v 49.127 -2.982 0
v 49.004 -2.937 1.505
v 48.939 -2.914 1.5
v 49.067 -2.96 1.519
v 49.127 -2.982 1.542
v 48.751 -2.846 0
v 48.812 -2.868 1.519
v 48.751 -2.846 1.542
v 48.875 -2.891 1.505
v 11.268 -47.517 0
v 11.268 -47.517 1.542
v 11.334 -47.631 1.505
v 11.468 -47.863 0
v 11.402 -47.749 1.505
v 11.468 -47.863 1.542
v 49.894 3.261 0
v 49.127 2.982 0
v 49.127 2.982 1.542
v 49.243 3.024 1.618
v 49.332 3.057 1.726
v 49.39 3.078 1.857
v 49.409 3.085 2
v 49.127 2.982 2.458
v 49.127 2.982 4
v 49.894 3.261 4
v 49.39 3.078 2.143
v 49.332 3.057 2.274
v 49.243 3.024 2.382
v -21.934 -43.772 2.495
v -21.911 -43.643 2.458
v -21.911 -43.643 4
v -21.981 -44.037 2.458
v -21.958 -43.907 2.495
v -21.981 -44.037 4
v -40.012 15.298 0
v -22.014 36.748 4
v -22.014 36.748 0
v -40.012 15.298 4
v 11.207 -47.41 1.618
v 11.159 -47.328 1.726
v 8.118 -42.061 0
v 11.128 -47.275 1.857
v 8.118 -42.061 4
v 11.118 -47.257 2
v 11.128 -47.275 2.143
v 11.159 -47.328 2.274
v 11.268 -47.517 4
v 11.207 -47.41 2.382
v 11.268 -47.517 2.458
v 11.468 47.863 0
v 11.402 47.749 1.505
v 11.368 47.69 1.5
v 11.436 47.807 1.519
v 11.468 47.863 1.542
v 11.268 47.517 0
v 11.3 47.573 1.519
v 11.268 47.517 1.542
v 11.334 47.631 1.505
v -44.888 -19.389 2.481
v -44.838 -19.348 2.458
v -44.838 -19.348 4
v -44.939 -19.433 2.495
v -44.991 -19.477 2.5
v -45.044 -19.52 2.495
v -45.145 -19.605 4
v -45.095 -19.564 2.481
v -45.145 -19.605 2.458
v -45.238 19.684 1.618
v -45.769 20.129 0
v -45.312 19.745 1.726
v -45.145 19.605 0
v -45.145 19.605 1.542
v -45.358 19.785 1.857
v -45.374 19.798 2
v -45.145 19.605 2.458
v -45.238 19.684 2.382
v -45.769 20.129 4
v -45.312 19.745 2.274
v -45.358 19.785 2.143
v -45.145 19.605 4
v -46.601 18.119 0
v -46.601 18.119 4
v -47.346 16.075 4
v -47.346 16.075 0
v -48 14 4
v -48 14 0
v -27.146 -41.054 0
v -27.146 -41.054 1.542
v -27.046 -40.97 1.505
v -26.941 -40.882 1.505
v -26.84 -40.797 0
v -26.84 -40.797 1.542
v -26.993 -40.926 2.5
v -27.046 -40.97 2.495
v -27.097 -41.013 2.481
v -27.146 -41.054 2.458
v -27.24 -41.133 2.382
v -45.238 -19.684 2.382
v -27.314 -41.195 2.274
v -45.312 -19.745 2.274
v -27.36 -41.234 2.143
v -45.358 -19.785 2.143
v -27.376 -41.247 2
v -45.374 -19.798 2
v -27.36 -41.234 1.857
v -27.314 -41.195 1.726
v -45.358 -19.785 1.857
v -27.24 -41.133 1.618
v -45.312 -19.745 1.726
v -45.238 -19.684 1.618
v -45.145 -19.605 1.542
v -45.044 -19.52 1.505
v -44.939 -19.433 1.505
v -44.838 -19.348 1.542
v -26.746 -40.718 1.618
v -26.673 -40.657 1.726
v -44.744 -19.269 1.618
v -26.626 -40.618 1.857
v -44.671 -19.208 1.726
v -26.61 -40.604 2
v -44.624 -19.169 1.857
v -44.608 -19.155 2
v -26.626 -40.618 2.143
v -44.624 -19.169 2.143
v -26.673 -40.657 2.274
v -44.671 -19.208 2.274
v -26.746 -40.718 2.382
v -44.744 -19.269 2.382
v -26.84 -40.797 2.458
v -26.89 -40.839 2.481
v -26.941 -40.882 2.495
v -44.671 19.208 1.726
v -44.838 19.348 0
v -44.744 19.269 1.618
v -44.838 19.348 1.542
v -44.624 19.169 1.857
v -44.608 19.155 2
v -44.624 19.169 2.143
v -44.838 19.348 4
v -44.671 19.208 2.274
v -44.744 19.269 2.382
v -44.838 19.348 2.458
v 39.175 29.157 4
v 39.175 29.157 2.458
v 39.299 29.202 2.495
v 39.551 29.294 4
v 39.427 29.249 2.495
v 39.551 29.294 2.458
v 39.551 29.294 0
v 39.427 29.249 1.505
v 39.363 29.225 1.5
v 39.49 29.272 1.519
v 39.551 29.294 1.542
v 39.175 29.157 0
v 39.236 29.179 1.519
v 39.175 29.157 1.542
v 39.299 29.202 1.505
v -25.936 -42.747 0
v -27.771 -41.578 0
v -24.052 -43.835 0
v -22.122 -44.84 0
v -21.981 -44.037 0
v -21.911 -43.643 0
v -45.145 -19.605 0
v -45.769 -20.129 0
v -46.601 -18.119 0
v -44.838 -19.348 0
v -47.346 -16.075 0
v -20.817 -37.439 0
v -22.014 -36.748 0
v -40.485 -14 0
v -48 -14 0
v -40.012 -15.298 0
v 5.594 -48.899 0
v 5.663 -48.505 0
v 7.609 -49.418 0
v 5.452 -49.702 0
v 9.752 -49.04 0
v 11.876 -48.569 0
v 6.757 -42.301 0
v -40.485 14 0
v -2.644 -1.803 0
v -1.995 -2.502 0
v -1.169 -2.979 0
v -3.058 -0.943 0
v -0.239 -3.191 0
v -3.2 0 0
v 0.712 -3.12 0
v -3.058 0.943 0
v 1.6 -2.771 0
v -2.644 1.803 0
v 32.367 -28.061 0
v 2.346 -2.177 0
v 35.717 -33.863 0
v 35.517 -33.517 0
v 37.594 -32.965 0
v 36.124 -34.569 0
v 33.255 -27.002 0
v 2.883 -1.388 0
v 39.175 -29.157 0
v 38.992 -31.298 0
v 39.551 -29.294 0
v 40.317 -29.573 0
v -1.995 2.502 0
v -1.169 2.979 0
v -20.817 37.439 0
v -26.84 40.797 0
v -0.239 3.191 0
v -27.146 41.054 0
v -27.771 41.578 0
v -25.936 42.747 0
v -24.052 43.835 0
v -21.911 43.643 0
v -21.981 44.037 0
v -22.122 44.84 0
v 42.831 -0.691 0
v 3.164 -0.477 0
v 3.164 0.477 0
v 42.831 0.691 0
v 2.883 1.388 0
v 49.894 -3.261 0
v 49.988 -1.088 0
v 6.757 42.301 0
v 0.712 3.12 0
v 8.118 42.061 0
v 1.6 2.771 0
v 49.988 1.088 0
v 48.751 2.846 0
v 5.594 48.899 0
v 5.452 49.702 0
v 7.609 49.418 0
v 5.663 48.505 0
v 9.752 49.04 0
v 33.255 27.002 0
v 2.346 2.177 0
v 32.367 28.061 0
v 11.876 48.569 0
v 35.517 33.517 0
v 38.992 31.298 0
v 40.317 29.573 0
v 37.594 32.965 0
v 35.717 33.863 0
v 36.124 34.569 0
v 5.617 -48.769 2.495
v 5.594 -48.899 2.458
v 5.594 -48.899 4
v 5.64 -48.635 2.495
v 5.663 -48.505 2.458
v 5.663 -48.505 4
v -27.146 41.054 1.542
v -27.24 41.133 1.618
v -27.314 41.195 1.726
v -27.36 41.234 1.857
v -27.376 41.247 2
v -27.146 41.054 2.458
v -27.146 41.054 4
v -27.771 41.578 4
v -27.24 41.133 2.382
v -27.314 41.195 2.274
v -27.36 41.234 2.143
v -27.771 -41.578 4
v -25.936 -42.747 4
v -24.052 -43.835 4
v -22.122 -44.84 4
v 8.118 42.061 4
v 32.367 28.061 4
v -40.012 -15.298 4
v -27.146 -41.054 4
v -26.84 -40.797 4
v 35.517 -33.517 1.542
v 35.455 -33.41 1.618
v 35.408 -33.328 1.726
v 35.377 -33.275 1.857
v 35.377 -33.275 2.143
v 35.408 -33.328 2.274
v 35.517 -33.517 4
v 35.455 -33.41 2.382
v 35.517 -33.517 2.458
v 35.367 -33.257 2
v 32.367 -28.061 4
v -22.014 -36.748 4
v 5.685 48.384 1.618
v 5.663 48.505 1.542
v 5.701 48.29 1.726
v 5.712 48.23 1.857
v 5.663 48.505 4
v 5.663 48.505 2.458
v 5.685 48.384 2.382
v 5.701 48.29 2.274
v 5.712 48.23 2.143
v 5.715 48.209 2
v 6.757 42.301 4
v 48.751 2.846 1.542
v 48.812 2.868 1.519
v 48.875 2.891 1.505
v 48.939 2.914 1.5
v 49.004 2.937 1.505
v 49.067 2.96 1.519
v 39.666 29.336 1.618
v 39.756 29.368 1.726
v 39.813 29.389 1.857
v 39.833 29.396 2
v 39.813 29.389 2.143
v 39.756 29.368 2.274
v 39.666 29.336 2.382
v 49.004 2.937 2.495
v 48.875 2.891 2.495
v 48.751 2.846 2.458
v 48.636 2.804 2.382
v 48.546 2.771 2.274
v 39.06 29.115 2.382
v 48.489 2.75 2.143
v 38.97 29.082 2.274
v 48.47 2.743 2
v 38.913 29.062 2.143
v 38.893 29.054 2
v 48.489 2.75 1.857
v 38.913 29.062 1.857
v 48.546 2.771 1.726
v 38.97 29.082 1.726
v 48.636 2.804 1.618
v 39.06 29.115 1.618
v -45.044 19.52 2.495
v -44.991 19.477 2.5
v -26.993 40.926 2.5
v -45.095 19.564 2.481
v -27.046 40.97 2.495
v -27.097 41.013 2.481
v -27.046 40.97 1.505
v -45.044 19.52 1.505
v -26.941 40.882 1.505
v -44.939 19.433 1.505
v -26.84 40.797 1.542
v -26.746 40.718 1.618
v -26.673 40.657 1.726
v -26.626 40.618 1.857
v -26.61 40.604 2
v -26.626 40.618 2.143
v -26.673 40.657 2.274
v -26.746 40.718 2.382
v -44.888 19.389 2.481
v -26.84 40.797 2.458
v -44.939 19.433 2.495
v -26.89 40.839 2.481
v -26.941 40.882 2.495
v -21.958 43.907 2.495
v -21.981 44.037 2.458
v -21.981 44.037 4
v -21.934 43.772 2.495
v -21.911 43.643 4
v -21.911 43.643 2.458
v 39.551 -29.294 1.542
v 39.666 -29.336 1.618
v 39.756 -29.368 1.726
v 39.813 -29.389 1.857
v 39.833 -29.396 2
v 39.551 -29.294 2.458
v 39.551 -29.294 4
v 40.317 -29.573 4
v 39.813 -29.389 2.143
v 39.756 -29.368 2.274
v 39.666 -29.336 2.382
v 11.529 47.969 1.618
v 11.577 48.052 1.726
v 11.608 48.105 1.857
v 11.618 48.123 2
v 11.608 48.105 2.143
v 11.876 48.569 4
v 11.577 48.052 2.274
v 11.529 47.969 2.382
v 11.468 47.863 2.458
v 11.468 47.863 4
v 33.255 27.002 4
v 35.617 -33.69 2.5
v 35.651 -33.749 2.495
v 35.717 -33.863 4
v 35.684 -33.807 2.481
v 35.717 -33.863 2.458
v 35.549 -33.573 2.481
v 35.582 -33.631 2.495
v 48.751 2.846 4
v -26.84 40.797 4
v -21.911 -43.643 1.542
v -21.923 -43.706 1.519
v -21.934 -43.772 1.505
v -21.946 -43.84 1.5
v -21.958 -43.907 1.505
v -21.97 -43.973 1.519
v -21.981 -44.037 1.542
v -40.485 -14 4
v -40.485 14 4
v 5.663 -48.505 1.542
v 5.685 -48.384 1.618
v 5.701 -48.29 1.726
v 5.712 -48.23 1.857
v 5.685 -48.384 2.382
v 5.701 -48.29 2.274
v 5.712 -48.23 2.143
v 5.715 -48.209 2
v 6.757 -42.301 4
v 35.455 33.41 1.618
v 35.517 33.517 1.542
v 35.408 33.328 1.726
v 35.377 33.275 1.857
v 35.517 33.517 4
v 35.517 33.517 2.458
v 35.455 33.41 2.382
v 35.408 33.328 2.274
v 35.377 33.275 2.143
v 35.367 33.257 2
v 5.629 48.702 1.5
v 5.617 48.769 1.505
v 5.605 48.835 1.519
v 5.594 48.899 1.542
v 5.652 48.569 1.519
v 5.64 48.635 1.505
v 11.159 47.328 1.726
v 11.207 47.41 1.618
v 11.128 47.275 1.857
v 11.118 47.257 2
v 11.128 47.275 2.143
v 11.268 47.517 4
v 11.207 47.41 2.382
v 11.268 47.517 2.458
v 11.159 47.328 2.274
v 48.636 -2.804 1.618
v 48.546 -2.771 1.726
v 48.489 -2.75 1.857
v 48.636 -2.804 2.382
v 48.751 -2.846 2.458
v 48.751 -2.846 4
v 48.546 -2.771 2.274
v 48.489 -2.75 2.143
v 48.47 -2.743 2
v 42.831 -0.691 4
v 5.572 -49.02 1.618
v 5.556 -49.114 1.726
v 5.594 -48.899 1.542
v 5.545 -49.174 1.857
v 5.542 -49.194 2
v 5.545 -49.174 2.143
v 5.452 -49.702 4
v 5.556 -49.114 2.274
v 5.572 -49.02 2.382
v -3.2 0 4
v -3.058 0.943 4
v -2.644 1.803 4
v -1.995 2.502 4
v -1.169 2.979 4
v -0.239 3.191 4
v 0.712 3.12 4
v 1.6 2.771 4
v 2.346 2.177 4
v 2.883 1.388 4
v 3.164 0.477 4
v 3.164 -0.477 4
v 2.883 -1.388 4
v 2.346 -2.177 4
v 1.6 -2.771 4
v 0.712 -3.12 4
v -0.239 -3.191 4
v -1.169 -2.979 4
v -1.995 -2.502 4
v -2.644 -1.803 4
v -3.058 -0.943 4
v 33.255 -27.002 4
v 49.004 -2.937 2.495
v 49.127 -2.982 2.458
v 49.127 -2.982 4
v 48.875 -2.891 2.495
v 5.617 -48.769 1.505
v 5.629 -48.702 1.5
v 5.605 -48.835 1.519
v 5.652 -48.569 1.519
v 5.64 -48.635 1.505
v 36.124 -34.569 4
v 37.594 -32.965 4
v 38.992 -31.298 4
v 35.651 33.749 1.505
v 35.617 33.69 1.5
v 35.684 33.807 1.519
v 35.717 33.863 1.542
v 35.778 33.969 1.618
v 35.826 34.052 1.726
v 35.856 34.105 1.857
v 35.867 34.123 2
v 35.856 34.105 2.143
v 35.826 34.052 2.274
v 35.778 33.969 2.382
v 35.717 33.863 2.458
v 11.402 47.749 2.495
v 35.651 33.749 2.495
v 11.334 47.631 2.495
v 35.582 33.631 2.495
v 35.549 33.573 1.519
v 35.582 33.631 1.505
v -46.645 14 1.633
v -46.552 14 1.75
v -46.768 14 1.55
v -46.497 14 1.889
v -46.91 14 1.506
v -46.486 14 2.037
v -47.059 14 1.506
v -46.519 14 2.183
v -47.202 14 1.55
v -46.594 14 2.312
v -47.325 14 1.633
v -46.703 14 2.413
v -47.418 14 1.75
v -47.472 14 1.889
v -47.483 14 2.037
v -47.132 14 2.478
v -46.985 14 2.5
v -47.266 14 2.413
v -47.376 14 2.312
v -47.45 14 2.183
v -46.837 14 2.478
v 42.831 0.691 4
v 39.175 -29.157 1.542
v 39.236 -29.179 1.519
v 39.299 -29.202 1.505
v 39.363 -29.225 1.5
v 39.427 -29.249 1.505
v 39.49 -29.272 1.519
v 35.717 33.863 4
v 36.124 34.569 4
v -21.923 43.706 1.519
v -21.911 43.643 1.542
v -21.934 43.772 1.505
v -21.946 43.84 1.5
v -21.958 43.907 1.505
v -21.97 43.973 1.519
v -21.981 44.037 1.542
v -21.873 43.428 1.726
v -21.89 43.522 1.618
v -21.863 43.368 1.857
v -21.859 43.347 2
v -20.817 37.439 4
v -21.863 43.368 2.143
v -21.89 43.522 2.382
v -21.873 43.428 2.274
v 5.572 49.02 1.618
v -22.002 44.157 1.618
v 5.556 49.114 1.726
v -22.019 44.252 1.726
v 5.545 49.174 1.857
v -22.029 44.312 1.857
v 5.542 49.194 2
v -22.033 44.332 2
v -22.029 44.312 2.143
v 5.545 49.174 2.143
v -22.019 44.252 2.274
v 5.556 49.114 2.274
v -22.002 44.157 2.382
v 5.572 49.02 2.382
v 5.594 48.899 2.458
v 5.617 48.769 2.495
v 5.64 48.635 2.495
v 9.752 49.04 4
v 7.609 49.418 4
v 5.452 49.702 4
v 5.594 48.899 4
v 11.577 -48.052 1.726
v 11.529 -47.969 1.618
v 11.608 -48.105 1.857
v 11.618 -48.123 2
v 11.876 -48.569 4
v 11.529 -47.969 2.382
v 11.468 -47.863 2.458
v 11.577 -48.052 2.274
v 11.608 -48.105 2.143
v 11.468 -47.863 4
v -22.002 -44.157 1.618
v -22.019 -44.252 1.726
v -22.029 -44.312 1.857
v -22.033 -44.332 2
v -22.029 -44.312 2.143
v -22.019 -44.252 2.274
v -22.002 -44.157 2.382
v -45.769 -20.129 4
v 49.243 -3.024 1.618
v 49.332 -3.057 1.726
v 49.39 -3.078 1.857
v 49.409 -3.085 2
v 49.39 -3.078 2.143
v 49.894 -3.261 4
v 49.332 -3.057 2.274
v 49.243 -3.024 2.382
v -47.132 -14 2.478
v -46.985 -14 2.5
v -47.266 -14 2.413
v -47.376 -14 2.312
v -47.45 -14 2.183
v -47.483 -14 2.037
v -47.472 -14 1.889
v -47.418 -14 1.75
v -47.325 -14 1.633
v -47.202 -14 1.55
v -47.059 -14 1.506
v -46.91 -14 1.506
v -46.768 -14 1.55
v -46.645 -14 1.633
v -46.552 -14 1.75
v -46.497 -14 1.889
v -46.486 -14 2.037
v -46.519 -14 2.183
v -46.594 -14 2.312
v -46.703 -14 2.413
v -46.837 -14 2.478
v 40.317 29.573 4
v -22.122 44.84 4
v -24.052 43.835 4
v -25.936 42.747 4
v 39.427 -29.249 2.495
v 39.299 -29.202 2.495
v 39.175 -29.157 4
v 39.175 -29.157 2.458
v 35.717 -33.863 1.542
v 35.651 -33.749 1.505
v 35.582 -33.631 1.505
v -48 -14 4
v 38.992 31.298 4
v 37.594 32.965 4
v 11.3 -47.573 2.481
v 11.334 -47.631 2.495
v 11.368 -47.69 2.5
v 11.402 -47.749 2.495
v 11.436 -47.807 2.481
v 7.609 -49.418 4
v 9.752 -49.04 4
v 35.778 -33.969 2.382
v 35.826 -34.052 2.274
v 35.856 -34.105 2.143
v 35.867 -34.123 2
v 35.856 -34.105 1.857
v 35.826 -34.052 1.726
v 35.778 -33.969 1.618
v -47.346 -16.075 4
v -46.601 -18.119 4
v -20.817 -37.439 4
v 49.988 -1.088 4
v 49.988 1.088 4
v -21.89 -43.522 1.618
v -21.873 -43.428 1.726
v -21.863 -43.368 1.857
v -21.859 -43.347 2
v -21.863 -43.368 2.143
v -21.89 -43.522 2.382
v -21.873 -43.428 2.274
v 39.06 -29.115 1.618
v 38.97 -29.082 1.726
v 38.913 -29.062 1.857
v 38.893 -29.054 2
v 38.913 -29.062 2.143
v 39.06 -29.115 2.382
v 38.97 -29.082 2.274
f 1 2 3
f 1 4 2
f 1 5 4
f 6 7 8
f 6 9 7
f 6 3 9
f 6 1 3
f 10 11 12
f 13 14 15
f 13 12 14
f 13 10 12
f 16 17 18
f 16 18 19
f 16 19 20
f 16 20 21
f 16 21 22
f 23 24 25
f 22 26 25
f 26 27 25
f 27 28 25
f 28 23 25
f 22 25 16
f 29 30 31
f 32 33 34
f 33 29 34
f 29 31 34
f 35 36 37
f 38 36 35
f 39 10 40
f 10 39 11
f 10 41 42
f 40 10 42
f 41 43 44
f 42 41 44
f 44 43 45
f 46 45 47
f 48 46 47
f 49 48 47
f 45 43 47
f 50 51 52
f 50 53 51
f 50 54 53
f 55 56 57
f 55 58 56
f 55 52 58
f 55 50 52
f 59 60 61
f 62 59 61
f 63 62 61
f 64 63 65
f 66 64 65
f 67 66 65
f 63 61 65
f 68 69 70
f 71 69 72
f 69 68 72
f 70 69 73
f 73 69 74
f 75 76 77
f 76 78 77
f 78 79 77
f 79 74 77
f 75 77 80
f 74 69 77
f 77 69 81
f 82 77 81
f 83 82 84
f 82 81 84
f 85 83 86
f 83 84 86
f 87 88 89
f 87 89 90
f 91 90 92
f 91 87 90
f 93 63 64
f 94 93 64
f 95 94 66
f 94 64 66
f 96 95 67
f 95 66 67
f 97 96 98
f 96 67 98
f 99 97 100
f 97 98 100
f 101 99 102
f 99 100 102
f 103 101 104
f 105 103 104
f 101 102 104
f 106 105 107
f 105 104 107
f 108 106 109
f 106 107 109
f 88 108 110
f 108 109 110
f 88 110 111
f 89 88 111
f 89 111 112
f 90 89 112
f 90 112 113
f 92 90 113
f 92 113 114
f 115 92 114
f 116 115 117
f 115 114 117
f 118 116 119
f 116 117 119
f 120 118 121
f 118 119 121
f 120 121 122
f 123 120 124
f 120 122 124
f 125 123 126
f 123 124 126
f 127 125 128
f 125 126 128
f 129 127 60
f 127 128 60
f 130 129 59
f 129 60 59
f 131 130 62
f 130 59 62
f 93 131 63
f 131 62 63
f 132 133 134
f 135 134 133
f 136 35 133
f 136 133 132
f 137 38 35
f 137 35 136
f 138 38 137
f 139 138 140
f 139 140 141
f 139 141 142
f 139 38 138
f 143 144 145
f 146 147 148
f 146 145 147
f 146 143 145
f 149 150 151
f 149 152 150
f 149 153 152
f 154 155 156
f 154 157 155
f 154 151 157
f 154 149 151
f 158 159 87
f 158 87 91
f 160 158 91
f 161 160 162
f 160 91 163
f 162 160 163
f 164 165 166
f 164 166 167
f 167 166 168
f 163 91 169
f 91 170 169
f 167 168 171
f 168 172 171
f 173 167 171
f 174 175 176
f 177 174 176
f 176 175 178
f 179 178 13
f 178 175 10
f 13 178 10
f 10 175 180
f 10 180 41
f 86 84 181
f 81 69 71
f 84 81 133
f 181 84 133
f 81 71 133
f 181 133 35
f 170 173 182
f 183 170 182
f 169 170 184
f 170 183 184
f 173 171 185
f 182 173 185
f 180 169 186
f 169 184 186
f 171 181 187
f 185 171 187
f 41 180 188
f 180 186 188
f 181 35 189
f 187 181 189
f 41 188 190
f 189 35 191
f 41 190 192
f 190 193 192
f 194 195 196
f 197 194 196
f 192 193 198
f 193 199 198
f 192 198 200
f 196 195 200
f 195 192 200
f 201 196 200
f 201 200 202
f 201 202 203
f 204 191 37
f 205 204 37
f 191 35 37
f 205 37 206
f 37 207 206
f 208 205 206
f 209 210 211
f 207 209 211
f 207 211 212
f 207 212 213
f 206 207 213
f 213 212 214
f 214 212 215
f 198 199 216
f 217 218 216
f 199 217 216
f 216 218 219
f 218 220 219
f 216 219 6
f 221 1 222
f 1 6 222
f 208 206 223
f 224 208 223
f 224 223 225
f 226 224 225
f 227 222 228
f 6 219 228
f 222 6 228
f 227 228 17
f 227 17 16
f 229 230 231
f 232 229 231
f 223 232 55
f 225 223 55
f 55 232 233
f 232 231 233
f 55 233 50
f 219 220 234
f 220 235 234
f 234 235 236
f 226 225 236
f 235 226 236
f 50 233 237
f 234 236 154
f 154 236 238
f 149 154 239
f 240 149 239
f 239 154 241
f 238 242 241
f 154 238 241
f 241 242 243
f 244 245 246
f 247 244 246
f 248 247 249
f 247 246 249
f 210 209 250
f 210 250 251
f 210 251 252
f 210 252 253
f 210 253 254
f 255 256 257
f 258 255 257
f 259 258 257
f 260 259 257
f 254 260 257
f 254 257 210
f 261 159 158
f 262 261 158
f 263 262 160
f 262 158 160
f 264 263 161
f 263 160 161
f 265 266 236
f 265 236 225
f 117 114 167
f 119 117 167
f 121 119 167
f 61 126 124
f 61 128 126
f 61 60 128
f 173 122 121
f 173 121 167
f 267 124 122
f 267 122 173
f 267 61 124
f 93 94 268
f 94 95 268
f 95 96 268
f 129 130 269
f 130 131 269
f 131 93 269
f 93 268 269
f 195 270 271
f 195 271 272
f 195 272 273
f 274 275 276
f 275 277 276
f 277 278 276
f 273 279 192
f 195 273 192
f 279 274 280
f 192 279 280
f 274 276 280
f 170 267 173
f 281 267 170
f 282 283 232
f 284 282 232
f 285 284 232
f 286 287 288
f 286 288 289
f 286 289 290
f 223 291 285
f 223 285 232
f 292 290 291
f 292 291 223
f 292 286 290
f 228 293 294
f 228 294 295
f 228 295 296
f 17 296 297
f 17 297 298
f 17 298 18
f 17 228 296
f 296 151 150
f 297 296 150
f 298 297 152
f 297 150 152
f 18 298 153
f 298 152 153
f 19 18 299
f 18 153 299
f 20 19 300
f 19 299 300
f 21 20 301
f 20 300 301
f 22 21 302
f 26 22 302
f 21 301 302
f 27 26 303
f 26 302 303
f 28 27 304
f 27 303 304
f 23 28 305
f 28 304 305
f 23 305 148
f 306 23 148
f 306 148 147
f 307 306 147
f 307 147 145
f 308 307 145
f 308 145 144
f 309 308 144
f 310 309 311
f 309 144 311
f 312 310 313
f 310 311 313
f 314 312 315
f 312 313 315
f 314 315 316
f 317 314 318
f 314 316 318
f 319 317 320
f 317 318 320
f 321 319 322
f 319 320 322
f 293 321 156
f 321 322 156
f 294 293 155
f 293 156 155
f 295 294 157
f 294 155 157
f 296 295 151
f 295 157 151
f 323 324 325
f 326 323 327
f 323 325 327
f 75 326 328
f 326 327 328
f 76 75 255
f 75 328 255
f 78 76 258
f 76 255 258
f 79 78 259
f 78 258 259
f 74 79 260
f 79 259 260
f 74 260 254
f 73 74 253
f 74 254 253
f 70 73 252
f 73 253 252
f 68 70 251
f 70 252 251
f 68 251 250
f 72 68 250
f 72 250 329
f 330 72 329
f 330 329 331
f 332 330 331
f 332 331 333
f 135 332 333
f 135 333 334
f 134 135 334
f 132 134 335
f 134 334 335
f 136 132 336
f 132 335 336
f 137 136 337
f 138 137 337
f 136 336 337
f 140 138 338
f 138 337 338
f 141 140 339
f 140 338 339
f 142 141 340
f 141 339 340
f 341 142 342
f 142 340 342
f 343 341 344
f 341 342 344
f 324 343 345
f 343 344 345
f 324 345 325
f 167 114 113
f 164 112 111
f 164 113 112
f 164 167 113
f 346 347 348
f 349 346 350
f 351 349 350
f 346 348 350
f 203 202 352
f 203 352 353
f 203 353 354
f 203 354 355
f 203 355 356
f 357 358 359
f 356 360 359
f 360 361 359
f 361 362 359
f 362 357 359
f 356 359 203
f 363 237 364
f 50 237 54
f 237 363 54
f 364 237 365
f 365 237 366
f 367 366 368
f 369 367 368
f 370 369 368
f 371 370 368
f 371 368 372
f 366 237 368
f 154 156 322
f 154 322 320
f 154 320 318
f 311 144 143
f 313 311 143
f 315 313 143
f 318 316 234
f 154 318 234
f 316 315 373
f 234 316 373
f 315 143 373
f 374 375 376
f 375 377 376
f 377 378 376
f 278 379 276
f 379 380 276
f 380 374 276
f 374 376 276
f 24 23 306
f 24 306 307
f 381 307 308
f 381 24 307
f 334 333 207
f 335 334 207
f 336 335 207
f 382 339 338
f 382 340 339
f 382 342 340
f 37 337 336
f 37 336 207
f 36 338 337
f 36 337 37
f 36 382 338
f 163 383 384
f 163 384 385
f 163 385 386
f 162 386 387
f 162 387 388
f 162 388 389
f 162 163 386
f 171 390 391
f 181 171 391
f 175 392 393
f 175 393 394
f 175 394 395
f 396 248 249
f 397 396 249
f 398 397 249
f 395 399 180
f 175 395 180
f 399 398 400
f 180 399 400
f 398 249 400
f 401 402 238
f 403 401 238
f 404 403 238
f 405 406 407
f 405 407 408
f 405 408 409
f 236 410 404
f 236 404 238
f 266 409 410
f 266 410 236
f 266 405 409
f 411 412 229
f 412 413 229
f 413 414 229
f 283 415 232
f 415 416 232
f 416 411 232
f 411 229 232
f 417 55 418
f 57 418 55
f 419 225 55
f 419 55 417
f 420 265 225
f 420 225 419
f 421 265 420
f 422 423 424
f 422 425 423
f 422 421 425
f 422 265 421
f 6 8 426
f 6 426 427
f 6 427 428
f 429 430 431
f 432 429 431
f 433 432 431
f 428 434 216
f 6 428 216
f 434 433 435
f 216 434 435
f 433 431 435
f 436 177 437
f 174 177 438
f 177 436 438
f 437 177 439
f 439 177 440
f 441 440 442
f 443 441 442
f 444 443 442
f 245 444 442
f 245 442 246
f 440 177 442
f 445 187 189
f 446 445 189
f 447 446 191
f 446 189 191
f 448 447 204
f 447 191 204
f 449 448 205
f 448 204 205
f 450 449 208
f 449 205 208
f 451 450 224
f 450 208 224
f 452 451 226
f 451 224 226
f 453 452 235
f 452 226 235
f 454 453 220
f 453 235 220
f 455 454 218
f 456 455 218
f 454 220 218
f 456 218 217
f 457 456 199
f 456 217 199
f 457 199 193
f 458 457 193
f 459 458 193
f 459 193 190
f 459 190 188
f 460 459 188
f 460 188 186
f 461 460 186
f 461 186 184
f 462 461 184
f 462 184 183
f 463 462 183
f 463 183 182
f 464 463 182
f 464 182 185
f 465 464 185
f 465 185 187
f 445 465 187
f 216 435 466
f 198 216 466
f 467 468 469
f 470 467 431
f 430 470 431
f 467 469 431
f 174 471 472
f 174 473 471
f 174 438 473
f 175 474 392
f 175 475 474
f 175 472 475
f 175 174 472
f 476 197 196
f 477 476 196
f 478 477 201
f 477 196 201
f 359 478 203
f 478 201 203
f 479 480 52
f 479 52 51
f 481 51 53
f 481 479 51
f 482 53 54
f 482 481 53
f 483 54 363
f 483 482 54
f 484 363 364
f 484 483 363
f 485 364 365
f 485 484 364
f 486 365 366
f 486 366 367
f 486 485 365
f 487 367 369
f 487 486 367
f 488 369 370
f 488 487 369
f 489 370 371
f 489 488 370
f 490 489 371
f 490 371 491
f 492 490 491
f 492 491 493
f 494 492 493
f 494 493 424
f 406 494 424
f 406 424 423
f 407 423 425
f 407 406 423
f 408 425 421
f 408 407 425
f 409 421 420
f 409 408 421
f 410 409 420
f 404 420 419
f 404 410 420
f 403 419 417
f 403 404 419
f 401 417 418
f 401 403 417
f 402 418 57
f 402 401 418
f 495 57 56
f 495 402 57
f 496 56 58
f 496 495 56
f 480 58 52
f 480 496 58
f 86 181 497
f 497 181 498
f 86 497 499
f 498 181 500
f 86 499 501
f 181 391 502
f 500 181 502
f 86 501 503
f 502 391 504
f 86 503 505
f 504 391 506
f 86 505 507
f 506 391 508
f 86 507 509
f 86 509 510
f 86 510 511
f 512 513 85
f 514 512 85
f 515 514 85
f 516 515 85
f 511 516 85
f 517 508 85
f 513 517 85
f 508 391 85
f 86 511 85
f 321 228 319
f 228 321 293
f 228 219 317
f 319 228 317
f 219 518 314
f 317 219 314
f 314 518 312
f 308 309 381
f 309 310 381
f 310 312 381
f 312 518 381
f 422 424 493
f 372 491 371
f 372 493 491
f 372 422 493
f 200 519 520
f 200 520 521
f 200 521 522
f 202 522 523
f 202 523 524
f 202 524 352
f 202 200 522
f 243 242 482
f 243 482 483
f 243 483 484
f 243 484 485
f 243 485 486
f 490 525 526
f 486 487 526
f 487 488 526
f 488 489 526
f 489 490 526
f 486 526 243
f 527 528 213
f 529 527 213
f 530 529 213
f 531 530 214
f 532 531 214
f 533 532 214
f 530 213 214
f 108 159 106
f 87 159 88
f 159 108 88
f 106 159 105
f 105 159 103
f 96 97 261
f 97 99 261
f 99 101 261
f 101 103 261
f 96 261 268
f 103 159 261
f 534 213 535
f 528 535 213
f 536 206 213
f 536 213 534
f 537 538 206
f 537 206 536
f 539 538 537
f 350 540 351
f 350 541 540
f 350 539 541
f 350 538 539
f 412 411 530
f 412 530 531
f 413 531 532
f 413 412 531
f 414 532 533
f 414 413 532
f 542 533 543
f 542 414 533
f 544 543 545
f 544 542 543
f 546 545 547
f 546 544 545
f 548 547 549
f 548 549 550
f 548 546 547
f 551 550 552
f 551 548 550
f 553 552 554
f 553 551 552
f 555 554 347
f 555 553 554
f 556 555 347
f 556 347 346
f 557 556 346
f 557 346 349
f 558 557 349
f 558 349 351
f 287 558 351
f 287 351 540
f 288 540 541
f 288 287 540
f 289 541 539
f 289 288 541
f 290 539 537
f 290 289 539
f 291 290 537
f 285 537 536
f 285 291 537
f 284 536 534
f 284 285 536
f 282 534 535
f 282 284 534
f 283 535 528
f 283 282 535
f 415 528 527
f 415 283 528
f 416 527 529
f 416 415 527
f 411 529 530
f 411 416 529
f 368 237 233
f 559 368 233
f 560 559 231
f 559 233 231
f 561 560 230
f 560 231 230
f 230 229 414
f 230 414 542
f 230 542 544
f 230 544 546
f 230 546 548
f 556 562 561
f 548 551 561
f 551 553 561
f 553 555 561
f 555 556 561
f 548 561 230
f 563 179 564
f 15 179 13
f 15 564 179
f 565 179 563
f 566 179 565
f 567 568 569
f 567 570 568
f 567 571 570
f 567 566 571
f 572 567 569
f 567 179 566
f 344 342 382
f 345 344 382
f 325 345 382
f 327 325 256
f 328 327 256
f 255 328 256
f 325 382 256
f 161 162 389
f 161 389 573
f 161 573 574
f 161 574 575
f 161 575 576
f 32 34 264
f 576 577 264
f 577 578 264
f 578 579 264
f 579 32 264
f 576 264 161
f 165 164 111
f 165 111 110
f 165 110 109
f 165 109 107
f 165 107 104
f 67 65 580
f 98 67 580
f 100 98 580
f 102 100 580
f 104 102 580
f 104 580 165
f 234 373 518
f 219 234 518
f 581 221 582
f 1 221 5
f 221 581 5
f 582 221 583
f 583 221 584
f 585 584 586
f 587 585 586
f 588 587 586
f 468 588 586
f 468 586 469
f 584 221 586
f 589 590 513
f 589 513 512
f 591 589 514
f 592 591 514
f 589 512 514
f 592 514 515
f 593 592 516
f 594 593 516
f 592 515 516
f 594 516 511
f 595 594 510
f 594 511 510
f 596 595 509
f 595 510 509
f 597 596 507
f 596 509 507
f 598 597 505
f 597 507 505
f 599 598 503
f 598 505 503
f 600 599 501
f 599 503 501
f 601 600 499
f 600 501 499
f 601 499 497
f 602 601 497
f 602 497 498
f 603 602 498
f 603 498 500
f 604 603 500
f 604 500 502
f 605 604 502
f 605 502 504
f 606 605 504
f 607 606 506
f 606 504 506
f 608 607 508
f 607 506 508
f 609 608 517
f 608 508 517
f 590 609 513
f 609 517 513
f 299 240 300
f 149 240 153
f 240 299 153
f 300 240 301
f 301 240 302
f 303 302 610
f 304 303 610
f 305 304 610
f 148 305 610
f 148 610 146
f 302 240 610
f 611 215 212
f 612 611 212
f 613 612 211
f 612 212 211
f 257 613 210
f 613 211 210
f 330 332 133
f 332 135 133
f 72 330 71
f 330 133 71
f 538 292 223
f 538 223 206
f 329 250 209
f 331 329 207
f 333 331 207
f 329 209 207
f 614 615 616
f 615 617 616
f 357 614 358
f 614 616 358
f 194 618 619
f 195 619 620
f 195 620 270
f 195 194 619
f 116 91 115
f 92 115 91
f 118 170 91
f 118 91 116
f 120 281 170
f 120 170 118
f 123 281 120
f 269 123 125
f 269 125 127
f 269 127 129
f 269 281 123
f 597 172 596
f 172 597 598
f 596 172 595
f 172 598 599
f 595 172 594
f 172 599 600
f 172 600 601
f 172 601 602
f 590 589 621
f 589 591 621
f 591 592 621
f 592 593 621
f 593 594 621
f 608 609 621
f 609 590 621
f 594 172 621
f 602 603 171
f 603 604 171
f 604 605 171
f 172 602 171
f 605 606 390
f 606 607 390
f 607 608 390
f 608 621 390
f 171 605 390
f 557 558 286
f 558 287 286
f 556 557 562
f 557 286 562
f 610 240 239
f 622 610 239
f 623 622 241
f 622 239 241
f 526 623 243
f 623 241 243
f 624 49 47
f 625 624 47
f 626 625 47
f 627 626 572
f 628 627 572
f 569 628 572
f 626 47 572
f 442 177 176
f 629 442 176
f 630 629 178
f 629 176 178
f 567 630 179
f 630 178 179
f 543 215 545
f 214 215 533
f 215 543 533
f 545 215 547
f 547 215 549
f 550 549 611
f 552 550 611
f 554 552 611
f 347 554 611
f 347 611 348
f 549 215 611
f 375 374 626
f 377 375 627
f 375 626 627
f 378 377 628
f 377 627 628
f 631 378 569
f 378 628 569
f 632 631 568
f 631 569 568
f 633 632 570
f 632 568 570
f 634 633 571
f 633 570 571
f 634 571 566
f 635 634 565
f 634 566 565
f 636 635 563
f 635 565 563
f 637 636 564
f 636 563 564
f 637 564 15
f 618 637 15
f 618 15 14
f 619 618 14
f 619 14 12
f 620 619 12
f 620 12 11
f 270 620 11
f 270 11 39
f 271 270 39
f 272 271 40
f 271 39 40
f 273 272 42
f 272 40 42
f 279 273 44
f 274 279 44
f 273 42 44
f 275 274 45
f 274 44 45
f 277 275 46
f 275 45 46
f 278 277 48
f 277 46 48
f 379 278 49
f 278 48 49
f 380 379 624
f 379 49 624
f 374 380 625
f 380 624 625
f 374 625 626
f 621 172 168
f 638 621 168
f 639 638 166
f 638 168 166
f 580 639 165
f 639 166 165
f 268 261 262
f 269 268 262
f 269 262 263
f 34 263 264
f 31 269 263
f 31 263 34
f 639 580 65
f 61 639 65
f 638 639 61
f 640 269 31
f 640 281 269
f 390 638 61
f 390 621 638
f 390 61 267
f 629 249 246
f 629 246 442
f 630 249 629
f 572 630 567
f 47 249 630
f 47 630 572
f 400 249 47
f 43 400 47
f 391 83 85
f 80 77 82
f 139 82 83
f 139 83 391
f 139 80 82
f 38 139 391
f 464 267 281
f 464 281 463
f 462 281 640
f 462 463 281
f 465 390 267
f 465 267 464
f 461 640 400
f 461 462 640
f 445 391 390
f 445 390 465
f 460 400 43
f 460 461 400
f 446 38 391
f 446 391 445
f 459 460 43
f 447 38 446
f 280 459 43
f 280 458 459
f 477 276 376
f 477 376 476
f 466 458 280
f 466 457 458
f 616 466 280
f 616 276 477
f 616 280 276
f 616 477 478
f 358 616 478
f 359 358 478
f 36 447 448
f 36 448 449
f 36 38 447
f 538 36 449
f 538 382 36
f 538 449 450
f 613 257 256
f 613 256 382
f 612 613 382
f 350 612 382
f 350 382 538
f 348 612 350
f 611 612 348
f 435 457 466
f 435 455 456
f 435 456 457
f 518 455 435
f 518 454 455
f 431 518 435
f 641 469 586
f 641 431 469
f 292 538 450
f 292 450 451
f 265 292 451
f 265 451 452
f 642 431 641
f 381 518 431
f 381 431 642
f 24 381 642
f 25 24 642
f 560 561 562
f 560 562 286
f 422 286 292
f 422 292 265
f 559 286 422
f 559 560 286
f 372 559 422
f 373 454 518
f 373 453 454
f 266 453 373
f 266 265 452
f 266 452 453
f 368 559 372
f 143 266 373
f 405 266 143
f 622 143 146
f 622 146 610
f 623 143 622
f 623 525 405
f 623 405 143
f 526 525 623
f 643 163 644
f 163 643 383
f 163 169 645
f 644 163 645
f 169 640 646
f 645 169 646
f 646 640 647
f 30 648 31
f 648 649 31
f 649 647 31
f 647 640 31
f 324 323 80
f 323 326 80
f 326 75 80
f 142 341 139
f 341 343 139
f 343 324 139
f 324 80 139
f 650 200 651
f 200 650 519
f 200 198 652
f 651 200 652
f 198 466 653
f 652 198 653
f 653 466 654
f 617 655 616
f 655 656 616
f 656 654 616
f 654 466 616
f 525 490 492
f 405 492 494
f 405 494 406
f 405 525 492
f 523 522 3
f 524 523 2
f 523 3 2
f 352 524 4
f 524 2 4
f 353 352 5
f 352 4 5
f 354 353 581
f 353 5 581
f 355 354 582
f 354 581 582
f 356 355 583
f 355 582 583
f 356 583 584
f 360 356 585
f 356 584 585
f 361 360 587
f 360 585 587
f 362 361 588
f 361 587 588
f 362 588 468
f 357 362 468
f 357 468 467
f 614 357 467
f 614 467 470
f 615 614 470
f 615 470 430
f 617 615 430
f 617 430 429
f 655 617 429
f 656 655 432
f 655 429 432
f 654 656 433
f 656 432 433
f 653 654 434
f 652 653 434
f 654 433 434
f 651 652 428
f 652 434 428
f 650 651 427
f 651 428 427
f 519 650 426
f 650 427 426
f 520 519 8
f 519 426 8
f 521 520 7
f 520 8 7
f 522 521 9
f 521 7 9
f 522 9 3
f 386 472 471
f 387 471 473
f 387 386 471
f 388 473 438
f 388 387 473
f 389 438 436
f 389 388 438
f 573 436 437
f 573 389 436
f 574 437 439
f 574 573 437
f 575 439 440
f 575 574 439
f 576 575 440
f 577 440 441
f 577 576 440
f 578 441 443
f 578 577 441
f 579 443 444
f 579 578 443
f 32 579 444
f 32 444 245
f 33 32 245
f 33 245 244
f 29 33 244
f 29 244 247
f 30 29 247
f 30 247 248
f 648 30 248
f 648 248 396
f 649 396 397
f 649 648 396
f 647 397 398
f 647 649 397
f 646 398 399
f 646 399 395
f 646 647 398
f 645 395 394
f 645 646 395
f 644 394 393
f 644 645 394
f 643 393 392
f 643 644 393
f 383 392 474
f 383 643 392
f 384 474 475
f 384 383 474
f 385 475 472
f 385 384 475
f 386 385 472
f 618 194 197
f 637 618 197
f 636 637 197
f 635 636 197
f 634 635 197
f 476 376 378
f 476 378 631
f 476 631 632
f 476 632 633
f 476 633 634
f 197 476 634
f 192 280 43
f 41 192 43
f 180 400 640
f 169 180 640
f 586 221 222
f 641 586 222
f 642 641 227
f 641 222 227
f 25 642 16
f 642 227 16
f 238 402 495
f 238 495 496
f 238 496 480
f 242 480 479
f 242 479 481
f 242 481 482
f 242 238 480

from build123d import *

# Parameters (mm, degrees)
SKETCH1_R           = 50
BOSS_EXTRUDE1_DEPTH = 4
SKETCH2_W           = 6.3
SKETCH2_H           = 28
CUT_EXTRUDE1_DEPTH  = 4
SKETCH5_W           = 0.4
SKETCH5_H           = 28
CUT_EXTRUDE2_DEPTH  = 1.8
SKETCH7_W           = 0.4
SKETCH7_H           = 28
CUT_EXTRUDE3_DEPTH  = 1.8
SKETCH8_W           = 0.5
SKETCH8_H           = 28
SKETCH9_W           = 0.5
SKETCH9_H           = 28
SKETCH10_W          = 28
SKETCH10_H          = 0.5
SKETCH11_W          = 28
SKETCH11_H          = 0.5
SKETCH12_W          = 0.5
SKETCH12_H          = 28
SKETCH13_W          = 0.5
SKETCH13_H          = 28
SKETCH14_W          = 28
SKETCH14_H          = 0.5
SKETCH15_W          = 0.5
SKETCH15_H          = 28
SKETCH16_W          = 28
SKETCH16_H          = 0.5
SKETCH17_R          = 3.2
CUT_EXTRUDE4_DEPTH  = 10


with BuildPart() as part:
    # Sketch1 → Boss-Extrude1 (new body)
    with BuildSketch(Plane.XY):
        Circle(SKETCH1_R)
    extrude(amount=BOSS_EXTRUDE1_DEPTH)

    # Sketch2 → Cut-Extrude1 (cut)
    with BuildSketch(Plane.XY.offset(4)):
        Polygon((5.663242619, 48.504941857), (6.757226139, 42.300653013), (-20.817390946, 37.438504038), (-21.911374465, 43.642792882), align=None)
        with BuildLine():
            Line((5.593783348, 48.898864958), (5.452196014, 49.701846632))
            ThreePointArc((5.452196014, 49.701846632), (-8.682408883, 49.240387651), (-22.12242107, 44.839697657))
            Line((-22.12242107, 44.839697657), (-21.980833736, 44.036715983))
            Line((-21.980833736, 44.036715983), (5.593783348, 48.898864958))
        make_face()
        Polygon((35.516671173, 33.516678987), (32.366671173, 28.060718943), (8.117959867, 42.060718943), (11.267959867, 47.516678987), align=None)
        Polygon((33.254827036, 27.002256002), (42.831391049, 0.69086262), (48.75145456, 2.845589522), (39.174890547, 29.156982905), align=None)
        with BuildLine():
            Line((40.316963791, 29.572663571), (39.550767596, 29.293790962))
            Line((39.550767596, 29.293790962), (49.127331609, 2.98239758))
            Line((49.127331609, 2.98239758), (49.893527804, 3.261270189))
            ThreePointArc((49.893527804, 3.261270189), (46.984631039, 17.101007166), (40.316963791, 29.572663571))
        make_face()
        with BuildLine():
            ThreePointArc((40.316963791, -29.572663571), (46.984631039, -17.101007166), (49.893527804, -3.261270189))
            Line((49.893527804, -3.261270189), (49.127331609, -2.98239758))
            Line((49.127331609, -2.98239758), (39.550767596, -29.293790962))
            Line((39.550767596, -29.293790962), (40.316963791, -29.572663571))
        make_face()
        Polygon((32.366671173, -28.060718943), (8.117959867, -42.060718943), (11.267959867, -47.516678987), (35.516671173, -33.516678987), align=None)
        with BuildLine():
            ThreePointArc((-22.12242107, -44.839697657), (-8.682408883, -49.240387651), (5.452196014, -49.701846632))
            Line((5.452196014, -49.701846632), (5.593783348, -48.898864958))
            Line((5.593783348, -48.898864958), (-21.980833736, -44.036715983))
            Line((-21.980833736, -44.036715983), (-22.12242107, -44.839697657))
        make_face()
        Polygon((6.757226139, -42.300653013), (-20.817390946, -37.438504038), (-21.911374465, -43.642792882), (5.663242619, -48.504941857), align=None)
        with BuildLine():
            Line((-45.144550944, -19.605073996), (-45.769159805, -20.129183061))
            ThreePointArc((-45.769159805, -20.129183061), (-38.302222156, -32.139380484), (-27.771106734, -41.578427469))
            Line((-27.771106734, -41.578427469), (-27.146497873, -41.054318403))
            Line((-27.146497873, -41.054318403), (-45.144550944, -19.605073996))
        make_face()
        Polygon((-44.838133167, -19.347958952), (-40.012053175, -15.298397011), (-22.014000104, -36.747641418), (-26.840080095, -40.797203359), align=None)
        with BuildLine():
            Line((-47.184631039, 14), (-48, 14))
            ThreePointArc((-48, 14), (-50, 0), (-48, -14))
            Line((-48, -14), (-47.184631039, -14))
            Line((-47.184631039, -14), (-47.184631039, 14))
        make_face()
        with Locations((-43.634631039, 0)):
            Rectangle(SKETCH2_W, SKETCH2_H)
        Polygon((-26.840080095, 40.797203359), (-22.014000104, 36.747641418), (-40.012053175, 15.298397011), (-44.838133167, 19.347958952), align=None)
        with BuildLine():
            Line((-27.146497873, 41.054318403), (-27.771106734, 41.578427469))
            ThreePointArc((-27.771106734, 41.578427469), (-38.302222156, 32.139380484), (-45.769159805, 20.129183061))
            Line((-45.769159805, 20.129183061), (-45.144550944, 19.605073996))
            Line((-45.144550944, 19.605073996), (-27.146497873, 41.054318403))
        make_face()
        with BuildLine():
            ThreePointArc((36.124355653, 34.569219382), (25, 43.301270189), (11.875644347, 48.569219382))
            Line((11.875644347, 48.569219382), (11.467959867, 47.863089148))
            Line((11.467959867, 47.863089148), (35.716671173, 33.863089148))
            Line((35.716671173, 33.863089148), (36.124355653, 34.569219382))
        make_face()
        Polygon((42.831391049, -0.69086262), (33.254827036, -27.002256002), (39.174890547, -29.156982905), (48.75145456, -2.845589522), align=None)
        with BuildLine():
            Line((11.467959867, -47.863089148), (35.716671173, -33.863089148))
            Line((35.716671173, -33.863089148), (36.124355653, -34.569219382))
            ThreePointArc((36.124355653, -34.569219382), (25, -43.301270189), (11.875644347, -48.569219382))
            Line((11.875644347, -48.569219382), (11.467959867, -47.863089148))
        make_face()
    extrude(amount=-CUT_EXTRUDE1_DEPTH, mode=Mode.SUBTRACT)

    # Sketch5 → Cut-Extrude2 (cut)
    with BuildSketch(Plane.XY.offset(4)):
        Polygon((39.174890547, 29.156982905), (39.550767596, 29.293790962), (49.127331609, 2.98239758), (48.75145456, 2.845589522), align=None)
        Polygon((39.174890547, -29.156982905), (39.550767596, -29.293790962), (49.127331609, -2.98239758), (48.75145456, -2.845589522), align=None)
        Polygon((11.267959867, -47.516678987), (11.467959867, -47.863089148), (35.716671173, -33.863089148), (35.516671173, -33.516678987), align=None)
        Polygon((-21.911374465, -43.642792882), (-21.980833736, -44.036715983), (5.593783348, -48.898864958), (5.663242619, -48.504941857), align=None)
        Polygon((-27.146497873, -41.054318403), (-26.840080095, -40.797203359), (-44.838133167, -19.347958952), (-45.144550944, -19.605073996), align=None)
        with Locations((-46.984631039, 0)):
            Rectangle(SKETCH5_W, SKETCH5_H)
        Polygon((-45.144550944, 19.605073996), (-44.838133167, 19.347958952), (-26.840080095, 40.797203359), (-27.146497873, 41.054318403), align=None)
        Polygon((-21.980833736, 44.036715983), (-21.911374465, 43.642792882), (5.663242619, 48.504941857), (5.593783348, 48.898864958), align=None)
        Polygon((11.267959867, 47.516678987), (11.467959867, 47.863089148), (35.716671173, 33.863089148), (35.516671173, 33.516678987), align=None)
    extrude(amount=-CUT_EXTRUDE2_DEPTH, mode=Mode.SUBTRACT)

    # Sketch7 → Cut-Extrude3 (cut)
    with BuildSketch(Plane(origin=(0, 0, 0), x_dir=(-1, 0, 0), z_dir=(0, 0, -1))):
        with Locations((46.984631039, 0)):
            Rectangle(SKETCH7_W, SKETCH7_H)
        Polygon((44.838133167, -19.347958952), (45.144550944, -19.605073996), (27.146497873, -41.054318403), (26.840080095, -40.797203359), align=None)
        Polygon((21.911374465, -43.642792882), (21.980833736, -44.036715983), (-5.593783348, -48.898864958), (-5.663242619, -48.504941857), align=None)
        Polygon((-11.267959867, -47.516678987), (-11.467959867, -47.863089148), (-35.716671173, -33.863089148), (-35.516671173, -33.516678987), align=None)
        Polygon((-39.174890547, -29.156982905), (-39.550767596, -29.293790962), (-49.127331609, -2.98239758), (-48.75145456, -2.845589522), align=None)
        Polygon((-48.75145456, 2.845589522), (-49.127331609, 2.98239758), (-39.550767596, 29.293790962), (-39.174890547, 29.156982905), align=None)
        Polygon((-35.716671173, 33.863089148), (-11.467959867, 47.863089148), (-11.267959867, 47.516678987), (-35.516671173, 33.516678987), align=None)
        Polygon((-5.593783348, 48.898864958), (-5.663242619, 48.504941857), (21.911374465, 43.642792882), (21.980833736, 44.036715983), align=None)
        Polygon((27.146497873, 41.054318403), (26.840080095, 40.797203359), (44.838133167, 19.347958952), (45.144550944, 19.605073996), align=None)
    extrude(amount=-CUT_EXTRUDE3_DEPTH, mode=Mode.SUBTRACT)

    # Sketch8 → Revolve1 (revolve)
    with BuildSketch(Plane.ZY.offset(46.984631039)):
        with Locations((2.25, 0)):
            Rectangle(SKETCH8_W, SKETCH8_H)
    revolve(axis=Axis((-46.984631039, 14, 2), (0, -1, 0)))

    # Sketch9 → Revolve2 (revolve)
    with BuildSketch(Plane(origin=(-35.99231552, 30.201138678, 0), x_dir=(0, 0, 1), z_dir=(-0.766044443, 0.64278761, 0))):
        with Locations((2.25, 0)):
            Rectangle(SKETCH9_W, SKETCH9_H)
    revolve(axis=Axis((-26.993288984, 40.925760881, 2), (-0.64278761, -0.766044443, 0)))

    # Sketch10 → Revolve3 (revolve)
    with BuildSketch(Plane(origin=(-8.158795558, 46.27082892, 0), x_dir=(0.984807753, 0.173648178, 0), z_dir=(-0.173648178, 0.984807753, 0))):
        with Locations((0, -1.75)):
            Rectangle(SKETCH10_W, SKETCH10_H)
    revolve(axis=Axis((-21.9461041, 43.839754433, 2), (0.984807753, 0.173648178, 0)))

    # Sketch11 → Revolve4 (revolve)
    with BuildSketch(Plane(origin=(23.49231552, 40.689884067, 0), x_dir=(0.866025404, -0.5, 0), z_dir=(0.5, 0.866025404, 0))):
        with Locations((0, -1.75)):
            Rectangle(SKETCH11_W, SKETCH11_H)
    revolve(axis=Axis((11.367959867, 47.689884067, 2), (0.866025404, -0.5, 0)))

    # Sketch12 → Revolve5 (revolve)
    with BuildSketch(Plane(origin=(44.151111078, 16.069690242, 0), x_dir=(0, 0, -1), z_dir=(0.939692621, 0.342020143, 0))):
        with Locations((-1.75, 0)):
            Rectangle(SKETCH12_W, SKETCH12_H)
    revolve(axis=Axis((39.362829071, 29.225386933, 2), (0.342020143, -0.939692621, 0)))

    # Sketch13 → Revolve6 (revolve)
    with BuildSketch(Plane(origin=(44.151111078, -16.069690242, 0), x_dir=(0, 0, -1), z_dir=(0.939692621, -0.342020143, 0))):
        with Locations((-1.75, 0)):
            Rectangle(SKETCH13_W, SKETCH13_H)
    revolve(axis=Axis((48.939393085, -2.913993551, 2), (-0.342020143, -0.939692621, 0)))

    # Sketch14 → Revolve7 (revolve)
    with BuildSketch(Plane(origin=(23.49231552, -40.689884067, 0), x_dir=(-0.866025404, -0.5, 0), z_dir=(0.5, -0.866025404, 0))):
        with Locations((0, -2.25)):
            Rectangle(SKETCH14_W, SKETCH14_H)
    revolve(axis=Axis((11.367959867, -47.689884067, 2), (0.866025404, 0.5, 0)))

    # Sketch15 → Revolve8 (revolve)
    with BuildSketch(Plane(origin=(-35.99231552, -30.201138678, 0), x_dir=(0, 0, 1), z_dir=(-0.766044443, -0.64278761, 0))):
        with Locations((2.25, 0)):
            Rectangle(SKETCH15_W, SKETCH15_H)
    revolve(axis=Axis((-44.991342055, -19.476516474, 2), (0.64278761, -0.766044443, 0)))

    # Sketch16 → Revolve9 (revolve)
    with BuildSketch(Plane(origin=(-8.158795558, -46.27082892, 0), x_dir=(-0.984807753, 0.173648178, 0), z_dir=(-0.173648178, -0.984807753, 0))):
        with Locations((0, -1.75)):
            Rectangle(SKETCH16_W, SKETCH16_H)
    revolve(axis=Axis((5.628512984, -48.701903407, 2), (-0.984807753, 0.173648178, 0)))

    # Sketch17 → Cut-Extrude4 (cut)
    with BuildSketch(Plane(origin=(0, 0, 0), x_dir=(-1, 0, 0), z_dir=(0, 0, -1))):
        Circle(SKETCH17_R)
    extrude(amount=-CUT_EXTRUDE4_DEPTH, mode=Mode.SUBTRACT)


solid = part.part
